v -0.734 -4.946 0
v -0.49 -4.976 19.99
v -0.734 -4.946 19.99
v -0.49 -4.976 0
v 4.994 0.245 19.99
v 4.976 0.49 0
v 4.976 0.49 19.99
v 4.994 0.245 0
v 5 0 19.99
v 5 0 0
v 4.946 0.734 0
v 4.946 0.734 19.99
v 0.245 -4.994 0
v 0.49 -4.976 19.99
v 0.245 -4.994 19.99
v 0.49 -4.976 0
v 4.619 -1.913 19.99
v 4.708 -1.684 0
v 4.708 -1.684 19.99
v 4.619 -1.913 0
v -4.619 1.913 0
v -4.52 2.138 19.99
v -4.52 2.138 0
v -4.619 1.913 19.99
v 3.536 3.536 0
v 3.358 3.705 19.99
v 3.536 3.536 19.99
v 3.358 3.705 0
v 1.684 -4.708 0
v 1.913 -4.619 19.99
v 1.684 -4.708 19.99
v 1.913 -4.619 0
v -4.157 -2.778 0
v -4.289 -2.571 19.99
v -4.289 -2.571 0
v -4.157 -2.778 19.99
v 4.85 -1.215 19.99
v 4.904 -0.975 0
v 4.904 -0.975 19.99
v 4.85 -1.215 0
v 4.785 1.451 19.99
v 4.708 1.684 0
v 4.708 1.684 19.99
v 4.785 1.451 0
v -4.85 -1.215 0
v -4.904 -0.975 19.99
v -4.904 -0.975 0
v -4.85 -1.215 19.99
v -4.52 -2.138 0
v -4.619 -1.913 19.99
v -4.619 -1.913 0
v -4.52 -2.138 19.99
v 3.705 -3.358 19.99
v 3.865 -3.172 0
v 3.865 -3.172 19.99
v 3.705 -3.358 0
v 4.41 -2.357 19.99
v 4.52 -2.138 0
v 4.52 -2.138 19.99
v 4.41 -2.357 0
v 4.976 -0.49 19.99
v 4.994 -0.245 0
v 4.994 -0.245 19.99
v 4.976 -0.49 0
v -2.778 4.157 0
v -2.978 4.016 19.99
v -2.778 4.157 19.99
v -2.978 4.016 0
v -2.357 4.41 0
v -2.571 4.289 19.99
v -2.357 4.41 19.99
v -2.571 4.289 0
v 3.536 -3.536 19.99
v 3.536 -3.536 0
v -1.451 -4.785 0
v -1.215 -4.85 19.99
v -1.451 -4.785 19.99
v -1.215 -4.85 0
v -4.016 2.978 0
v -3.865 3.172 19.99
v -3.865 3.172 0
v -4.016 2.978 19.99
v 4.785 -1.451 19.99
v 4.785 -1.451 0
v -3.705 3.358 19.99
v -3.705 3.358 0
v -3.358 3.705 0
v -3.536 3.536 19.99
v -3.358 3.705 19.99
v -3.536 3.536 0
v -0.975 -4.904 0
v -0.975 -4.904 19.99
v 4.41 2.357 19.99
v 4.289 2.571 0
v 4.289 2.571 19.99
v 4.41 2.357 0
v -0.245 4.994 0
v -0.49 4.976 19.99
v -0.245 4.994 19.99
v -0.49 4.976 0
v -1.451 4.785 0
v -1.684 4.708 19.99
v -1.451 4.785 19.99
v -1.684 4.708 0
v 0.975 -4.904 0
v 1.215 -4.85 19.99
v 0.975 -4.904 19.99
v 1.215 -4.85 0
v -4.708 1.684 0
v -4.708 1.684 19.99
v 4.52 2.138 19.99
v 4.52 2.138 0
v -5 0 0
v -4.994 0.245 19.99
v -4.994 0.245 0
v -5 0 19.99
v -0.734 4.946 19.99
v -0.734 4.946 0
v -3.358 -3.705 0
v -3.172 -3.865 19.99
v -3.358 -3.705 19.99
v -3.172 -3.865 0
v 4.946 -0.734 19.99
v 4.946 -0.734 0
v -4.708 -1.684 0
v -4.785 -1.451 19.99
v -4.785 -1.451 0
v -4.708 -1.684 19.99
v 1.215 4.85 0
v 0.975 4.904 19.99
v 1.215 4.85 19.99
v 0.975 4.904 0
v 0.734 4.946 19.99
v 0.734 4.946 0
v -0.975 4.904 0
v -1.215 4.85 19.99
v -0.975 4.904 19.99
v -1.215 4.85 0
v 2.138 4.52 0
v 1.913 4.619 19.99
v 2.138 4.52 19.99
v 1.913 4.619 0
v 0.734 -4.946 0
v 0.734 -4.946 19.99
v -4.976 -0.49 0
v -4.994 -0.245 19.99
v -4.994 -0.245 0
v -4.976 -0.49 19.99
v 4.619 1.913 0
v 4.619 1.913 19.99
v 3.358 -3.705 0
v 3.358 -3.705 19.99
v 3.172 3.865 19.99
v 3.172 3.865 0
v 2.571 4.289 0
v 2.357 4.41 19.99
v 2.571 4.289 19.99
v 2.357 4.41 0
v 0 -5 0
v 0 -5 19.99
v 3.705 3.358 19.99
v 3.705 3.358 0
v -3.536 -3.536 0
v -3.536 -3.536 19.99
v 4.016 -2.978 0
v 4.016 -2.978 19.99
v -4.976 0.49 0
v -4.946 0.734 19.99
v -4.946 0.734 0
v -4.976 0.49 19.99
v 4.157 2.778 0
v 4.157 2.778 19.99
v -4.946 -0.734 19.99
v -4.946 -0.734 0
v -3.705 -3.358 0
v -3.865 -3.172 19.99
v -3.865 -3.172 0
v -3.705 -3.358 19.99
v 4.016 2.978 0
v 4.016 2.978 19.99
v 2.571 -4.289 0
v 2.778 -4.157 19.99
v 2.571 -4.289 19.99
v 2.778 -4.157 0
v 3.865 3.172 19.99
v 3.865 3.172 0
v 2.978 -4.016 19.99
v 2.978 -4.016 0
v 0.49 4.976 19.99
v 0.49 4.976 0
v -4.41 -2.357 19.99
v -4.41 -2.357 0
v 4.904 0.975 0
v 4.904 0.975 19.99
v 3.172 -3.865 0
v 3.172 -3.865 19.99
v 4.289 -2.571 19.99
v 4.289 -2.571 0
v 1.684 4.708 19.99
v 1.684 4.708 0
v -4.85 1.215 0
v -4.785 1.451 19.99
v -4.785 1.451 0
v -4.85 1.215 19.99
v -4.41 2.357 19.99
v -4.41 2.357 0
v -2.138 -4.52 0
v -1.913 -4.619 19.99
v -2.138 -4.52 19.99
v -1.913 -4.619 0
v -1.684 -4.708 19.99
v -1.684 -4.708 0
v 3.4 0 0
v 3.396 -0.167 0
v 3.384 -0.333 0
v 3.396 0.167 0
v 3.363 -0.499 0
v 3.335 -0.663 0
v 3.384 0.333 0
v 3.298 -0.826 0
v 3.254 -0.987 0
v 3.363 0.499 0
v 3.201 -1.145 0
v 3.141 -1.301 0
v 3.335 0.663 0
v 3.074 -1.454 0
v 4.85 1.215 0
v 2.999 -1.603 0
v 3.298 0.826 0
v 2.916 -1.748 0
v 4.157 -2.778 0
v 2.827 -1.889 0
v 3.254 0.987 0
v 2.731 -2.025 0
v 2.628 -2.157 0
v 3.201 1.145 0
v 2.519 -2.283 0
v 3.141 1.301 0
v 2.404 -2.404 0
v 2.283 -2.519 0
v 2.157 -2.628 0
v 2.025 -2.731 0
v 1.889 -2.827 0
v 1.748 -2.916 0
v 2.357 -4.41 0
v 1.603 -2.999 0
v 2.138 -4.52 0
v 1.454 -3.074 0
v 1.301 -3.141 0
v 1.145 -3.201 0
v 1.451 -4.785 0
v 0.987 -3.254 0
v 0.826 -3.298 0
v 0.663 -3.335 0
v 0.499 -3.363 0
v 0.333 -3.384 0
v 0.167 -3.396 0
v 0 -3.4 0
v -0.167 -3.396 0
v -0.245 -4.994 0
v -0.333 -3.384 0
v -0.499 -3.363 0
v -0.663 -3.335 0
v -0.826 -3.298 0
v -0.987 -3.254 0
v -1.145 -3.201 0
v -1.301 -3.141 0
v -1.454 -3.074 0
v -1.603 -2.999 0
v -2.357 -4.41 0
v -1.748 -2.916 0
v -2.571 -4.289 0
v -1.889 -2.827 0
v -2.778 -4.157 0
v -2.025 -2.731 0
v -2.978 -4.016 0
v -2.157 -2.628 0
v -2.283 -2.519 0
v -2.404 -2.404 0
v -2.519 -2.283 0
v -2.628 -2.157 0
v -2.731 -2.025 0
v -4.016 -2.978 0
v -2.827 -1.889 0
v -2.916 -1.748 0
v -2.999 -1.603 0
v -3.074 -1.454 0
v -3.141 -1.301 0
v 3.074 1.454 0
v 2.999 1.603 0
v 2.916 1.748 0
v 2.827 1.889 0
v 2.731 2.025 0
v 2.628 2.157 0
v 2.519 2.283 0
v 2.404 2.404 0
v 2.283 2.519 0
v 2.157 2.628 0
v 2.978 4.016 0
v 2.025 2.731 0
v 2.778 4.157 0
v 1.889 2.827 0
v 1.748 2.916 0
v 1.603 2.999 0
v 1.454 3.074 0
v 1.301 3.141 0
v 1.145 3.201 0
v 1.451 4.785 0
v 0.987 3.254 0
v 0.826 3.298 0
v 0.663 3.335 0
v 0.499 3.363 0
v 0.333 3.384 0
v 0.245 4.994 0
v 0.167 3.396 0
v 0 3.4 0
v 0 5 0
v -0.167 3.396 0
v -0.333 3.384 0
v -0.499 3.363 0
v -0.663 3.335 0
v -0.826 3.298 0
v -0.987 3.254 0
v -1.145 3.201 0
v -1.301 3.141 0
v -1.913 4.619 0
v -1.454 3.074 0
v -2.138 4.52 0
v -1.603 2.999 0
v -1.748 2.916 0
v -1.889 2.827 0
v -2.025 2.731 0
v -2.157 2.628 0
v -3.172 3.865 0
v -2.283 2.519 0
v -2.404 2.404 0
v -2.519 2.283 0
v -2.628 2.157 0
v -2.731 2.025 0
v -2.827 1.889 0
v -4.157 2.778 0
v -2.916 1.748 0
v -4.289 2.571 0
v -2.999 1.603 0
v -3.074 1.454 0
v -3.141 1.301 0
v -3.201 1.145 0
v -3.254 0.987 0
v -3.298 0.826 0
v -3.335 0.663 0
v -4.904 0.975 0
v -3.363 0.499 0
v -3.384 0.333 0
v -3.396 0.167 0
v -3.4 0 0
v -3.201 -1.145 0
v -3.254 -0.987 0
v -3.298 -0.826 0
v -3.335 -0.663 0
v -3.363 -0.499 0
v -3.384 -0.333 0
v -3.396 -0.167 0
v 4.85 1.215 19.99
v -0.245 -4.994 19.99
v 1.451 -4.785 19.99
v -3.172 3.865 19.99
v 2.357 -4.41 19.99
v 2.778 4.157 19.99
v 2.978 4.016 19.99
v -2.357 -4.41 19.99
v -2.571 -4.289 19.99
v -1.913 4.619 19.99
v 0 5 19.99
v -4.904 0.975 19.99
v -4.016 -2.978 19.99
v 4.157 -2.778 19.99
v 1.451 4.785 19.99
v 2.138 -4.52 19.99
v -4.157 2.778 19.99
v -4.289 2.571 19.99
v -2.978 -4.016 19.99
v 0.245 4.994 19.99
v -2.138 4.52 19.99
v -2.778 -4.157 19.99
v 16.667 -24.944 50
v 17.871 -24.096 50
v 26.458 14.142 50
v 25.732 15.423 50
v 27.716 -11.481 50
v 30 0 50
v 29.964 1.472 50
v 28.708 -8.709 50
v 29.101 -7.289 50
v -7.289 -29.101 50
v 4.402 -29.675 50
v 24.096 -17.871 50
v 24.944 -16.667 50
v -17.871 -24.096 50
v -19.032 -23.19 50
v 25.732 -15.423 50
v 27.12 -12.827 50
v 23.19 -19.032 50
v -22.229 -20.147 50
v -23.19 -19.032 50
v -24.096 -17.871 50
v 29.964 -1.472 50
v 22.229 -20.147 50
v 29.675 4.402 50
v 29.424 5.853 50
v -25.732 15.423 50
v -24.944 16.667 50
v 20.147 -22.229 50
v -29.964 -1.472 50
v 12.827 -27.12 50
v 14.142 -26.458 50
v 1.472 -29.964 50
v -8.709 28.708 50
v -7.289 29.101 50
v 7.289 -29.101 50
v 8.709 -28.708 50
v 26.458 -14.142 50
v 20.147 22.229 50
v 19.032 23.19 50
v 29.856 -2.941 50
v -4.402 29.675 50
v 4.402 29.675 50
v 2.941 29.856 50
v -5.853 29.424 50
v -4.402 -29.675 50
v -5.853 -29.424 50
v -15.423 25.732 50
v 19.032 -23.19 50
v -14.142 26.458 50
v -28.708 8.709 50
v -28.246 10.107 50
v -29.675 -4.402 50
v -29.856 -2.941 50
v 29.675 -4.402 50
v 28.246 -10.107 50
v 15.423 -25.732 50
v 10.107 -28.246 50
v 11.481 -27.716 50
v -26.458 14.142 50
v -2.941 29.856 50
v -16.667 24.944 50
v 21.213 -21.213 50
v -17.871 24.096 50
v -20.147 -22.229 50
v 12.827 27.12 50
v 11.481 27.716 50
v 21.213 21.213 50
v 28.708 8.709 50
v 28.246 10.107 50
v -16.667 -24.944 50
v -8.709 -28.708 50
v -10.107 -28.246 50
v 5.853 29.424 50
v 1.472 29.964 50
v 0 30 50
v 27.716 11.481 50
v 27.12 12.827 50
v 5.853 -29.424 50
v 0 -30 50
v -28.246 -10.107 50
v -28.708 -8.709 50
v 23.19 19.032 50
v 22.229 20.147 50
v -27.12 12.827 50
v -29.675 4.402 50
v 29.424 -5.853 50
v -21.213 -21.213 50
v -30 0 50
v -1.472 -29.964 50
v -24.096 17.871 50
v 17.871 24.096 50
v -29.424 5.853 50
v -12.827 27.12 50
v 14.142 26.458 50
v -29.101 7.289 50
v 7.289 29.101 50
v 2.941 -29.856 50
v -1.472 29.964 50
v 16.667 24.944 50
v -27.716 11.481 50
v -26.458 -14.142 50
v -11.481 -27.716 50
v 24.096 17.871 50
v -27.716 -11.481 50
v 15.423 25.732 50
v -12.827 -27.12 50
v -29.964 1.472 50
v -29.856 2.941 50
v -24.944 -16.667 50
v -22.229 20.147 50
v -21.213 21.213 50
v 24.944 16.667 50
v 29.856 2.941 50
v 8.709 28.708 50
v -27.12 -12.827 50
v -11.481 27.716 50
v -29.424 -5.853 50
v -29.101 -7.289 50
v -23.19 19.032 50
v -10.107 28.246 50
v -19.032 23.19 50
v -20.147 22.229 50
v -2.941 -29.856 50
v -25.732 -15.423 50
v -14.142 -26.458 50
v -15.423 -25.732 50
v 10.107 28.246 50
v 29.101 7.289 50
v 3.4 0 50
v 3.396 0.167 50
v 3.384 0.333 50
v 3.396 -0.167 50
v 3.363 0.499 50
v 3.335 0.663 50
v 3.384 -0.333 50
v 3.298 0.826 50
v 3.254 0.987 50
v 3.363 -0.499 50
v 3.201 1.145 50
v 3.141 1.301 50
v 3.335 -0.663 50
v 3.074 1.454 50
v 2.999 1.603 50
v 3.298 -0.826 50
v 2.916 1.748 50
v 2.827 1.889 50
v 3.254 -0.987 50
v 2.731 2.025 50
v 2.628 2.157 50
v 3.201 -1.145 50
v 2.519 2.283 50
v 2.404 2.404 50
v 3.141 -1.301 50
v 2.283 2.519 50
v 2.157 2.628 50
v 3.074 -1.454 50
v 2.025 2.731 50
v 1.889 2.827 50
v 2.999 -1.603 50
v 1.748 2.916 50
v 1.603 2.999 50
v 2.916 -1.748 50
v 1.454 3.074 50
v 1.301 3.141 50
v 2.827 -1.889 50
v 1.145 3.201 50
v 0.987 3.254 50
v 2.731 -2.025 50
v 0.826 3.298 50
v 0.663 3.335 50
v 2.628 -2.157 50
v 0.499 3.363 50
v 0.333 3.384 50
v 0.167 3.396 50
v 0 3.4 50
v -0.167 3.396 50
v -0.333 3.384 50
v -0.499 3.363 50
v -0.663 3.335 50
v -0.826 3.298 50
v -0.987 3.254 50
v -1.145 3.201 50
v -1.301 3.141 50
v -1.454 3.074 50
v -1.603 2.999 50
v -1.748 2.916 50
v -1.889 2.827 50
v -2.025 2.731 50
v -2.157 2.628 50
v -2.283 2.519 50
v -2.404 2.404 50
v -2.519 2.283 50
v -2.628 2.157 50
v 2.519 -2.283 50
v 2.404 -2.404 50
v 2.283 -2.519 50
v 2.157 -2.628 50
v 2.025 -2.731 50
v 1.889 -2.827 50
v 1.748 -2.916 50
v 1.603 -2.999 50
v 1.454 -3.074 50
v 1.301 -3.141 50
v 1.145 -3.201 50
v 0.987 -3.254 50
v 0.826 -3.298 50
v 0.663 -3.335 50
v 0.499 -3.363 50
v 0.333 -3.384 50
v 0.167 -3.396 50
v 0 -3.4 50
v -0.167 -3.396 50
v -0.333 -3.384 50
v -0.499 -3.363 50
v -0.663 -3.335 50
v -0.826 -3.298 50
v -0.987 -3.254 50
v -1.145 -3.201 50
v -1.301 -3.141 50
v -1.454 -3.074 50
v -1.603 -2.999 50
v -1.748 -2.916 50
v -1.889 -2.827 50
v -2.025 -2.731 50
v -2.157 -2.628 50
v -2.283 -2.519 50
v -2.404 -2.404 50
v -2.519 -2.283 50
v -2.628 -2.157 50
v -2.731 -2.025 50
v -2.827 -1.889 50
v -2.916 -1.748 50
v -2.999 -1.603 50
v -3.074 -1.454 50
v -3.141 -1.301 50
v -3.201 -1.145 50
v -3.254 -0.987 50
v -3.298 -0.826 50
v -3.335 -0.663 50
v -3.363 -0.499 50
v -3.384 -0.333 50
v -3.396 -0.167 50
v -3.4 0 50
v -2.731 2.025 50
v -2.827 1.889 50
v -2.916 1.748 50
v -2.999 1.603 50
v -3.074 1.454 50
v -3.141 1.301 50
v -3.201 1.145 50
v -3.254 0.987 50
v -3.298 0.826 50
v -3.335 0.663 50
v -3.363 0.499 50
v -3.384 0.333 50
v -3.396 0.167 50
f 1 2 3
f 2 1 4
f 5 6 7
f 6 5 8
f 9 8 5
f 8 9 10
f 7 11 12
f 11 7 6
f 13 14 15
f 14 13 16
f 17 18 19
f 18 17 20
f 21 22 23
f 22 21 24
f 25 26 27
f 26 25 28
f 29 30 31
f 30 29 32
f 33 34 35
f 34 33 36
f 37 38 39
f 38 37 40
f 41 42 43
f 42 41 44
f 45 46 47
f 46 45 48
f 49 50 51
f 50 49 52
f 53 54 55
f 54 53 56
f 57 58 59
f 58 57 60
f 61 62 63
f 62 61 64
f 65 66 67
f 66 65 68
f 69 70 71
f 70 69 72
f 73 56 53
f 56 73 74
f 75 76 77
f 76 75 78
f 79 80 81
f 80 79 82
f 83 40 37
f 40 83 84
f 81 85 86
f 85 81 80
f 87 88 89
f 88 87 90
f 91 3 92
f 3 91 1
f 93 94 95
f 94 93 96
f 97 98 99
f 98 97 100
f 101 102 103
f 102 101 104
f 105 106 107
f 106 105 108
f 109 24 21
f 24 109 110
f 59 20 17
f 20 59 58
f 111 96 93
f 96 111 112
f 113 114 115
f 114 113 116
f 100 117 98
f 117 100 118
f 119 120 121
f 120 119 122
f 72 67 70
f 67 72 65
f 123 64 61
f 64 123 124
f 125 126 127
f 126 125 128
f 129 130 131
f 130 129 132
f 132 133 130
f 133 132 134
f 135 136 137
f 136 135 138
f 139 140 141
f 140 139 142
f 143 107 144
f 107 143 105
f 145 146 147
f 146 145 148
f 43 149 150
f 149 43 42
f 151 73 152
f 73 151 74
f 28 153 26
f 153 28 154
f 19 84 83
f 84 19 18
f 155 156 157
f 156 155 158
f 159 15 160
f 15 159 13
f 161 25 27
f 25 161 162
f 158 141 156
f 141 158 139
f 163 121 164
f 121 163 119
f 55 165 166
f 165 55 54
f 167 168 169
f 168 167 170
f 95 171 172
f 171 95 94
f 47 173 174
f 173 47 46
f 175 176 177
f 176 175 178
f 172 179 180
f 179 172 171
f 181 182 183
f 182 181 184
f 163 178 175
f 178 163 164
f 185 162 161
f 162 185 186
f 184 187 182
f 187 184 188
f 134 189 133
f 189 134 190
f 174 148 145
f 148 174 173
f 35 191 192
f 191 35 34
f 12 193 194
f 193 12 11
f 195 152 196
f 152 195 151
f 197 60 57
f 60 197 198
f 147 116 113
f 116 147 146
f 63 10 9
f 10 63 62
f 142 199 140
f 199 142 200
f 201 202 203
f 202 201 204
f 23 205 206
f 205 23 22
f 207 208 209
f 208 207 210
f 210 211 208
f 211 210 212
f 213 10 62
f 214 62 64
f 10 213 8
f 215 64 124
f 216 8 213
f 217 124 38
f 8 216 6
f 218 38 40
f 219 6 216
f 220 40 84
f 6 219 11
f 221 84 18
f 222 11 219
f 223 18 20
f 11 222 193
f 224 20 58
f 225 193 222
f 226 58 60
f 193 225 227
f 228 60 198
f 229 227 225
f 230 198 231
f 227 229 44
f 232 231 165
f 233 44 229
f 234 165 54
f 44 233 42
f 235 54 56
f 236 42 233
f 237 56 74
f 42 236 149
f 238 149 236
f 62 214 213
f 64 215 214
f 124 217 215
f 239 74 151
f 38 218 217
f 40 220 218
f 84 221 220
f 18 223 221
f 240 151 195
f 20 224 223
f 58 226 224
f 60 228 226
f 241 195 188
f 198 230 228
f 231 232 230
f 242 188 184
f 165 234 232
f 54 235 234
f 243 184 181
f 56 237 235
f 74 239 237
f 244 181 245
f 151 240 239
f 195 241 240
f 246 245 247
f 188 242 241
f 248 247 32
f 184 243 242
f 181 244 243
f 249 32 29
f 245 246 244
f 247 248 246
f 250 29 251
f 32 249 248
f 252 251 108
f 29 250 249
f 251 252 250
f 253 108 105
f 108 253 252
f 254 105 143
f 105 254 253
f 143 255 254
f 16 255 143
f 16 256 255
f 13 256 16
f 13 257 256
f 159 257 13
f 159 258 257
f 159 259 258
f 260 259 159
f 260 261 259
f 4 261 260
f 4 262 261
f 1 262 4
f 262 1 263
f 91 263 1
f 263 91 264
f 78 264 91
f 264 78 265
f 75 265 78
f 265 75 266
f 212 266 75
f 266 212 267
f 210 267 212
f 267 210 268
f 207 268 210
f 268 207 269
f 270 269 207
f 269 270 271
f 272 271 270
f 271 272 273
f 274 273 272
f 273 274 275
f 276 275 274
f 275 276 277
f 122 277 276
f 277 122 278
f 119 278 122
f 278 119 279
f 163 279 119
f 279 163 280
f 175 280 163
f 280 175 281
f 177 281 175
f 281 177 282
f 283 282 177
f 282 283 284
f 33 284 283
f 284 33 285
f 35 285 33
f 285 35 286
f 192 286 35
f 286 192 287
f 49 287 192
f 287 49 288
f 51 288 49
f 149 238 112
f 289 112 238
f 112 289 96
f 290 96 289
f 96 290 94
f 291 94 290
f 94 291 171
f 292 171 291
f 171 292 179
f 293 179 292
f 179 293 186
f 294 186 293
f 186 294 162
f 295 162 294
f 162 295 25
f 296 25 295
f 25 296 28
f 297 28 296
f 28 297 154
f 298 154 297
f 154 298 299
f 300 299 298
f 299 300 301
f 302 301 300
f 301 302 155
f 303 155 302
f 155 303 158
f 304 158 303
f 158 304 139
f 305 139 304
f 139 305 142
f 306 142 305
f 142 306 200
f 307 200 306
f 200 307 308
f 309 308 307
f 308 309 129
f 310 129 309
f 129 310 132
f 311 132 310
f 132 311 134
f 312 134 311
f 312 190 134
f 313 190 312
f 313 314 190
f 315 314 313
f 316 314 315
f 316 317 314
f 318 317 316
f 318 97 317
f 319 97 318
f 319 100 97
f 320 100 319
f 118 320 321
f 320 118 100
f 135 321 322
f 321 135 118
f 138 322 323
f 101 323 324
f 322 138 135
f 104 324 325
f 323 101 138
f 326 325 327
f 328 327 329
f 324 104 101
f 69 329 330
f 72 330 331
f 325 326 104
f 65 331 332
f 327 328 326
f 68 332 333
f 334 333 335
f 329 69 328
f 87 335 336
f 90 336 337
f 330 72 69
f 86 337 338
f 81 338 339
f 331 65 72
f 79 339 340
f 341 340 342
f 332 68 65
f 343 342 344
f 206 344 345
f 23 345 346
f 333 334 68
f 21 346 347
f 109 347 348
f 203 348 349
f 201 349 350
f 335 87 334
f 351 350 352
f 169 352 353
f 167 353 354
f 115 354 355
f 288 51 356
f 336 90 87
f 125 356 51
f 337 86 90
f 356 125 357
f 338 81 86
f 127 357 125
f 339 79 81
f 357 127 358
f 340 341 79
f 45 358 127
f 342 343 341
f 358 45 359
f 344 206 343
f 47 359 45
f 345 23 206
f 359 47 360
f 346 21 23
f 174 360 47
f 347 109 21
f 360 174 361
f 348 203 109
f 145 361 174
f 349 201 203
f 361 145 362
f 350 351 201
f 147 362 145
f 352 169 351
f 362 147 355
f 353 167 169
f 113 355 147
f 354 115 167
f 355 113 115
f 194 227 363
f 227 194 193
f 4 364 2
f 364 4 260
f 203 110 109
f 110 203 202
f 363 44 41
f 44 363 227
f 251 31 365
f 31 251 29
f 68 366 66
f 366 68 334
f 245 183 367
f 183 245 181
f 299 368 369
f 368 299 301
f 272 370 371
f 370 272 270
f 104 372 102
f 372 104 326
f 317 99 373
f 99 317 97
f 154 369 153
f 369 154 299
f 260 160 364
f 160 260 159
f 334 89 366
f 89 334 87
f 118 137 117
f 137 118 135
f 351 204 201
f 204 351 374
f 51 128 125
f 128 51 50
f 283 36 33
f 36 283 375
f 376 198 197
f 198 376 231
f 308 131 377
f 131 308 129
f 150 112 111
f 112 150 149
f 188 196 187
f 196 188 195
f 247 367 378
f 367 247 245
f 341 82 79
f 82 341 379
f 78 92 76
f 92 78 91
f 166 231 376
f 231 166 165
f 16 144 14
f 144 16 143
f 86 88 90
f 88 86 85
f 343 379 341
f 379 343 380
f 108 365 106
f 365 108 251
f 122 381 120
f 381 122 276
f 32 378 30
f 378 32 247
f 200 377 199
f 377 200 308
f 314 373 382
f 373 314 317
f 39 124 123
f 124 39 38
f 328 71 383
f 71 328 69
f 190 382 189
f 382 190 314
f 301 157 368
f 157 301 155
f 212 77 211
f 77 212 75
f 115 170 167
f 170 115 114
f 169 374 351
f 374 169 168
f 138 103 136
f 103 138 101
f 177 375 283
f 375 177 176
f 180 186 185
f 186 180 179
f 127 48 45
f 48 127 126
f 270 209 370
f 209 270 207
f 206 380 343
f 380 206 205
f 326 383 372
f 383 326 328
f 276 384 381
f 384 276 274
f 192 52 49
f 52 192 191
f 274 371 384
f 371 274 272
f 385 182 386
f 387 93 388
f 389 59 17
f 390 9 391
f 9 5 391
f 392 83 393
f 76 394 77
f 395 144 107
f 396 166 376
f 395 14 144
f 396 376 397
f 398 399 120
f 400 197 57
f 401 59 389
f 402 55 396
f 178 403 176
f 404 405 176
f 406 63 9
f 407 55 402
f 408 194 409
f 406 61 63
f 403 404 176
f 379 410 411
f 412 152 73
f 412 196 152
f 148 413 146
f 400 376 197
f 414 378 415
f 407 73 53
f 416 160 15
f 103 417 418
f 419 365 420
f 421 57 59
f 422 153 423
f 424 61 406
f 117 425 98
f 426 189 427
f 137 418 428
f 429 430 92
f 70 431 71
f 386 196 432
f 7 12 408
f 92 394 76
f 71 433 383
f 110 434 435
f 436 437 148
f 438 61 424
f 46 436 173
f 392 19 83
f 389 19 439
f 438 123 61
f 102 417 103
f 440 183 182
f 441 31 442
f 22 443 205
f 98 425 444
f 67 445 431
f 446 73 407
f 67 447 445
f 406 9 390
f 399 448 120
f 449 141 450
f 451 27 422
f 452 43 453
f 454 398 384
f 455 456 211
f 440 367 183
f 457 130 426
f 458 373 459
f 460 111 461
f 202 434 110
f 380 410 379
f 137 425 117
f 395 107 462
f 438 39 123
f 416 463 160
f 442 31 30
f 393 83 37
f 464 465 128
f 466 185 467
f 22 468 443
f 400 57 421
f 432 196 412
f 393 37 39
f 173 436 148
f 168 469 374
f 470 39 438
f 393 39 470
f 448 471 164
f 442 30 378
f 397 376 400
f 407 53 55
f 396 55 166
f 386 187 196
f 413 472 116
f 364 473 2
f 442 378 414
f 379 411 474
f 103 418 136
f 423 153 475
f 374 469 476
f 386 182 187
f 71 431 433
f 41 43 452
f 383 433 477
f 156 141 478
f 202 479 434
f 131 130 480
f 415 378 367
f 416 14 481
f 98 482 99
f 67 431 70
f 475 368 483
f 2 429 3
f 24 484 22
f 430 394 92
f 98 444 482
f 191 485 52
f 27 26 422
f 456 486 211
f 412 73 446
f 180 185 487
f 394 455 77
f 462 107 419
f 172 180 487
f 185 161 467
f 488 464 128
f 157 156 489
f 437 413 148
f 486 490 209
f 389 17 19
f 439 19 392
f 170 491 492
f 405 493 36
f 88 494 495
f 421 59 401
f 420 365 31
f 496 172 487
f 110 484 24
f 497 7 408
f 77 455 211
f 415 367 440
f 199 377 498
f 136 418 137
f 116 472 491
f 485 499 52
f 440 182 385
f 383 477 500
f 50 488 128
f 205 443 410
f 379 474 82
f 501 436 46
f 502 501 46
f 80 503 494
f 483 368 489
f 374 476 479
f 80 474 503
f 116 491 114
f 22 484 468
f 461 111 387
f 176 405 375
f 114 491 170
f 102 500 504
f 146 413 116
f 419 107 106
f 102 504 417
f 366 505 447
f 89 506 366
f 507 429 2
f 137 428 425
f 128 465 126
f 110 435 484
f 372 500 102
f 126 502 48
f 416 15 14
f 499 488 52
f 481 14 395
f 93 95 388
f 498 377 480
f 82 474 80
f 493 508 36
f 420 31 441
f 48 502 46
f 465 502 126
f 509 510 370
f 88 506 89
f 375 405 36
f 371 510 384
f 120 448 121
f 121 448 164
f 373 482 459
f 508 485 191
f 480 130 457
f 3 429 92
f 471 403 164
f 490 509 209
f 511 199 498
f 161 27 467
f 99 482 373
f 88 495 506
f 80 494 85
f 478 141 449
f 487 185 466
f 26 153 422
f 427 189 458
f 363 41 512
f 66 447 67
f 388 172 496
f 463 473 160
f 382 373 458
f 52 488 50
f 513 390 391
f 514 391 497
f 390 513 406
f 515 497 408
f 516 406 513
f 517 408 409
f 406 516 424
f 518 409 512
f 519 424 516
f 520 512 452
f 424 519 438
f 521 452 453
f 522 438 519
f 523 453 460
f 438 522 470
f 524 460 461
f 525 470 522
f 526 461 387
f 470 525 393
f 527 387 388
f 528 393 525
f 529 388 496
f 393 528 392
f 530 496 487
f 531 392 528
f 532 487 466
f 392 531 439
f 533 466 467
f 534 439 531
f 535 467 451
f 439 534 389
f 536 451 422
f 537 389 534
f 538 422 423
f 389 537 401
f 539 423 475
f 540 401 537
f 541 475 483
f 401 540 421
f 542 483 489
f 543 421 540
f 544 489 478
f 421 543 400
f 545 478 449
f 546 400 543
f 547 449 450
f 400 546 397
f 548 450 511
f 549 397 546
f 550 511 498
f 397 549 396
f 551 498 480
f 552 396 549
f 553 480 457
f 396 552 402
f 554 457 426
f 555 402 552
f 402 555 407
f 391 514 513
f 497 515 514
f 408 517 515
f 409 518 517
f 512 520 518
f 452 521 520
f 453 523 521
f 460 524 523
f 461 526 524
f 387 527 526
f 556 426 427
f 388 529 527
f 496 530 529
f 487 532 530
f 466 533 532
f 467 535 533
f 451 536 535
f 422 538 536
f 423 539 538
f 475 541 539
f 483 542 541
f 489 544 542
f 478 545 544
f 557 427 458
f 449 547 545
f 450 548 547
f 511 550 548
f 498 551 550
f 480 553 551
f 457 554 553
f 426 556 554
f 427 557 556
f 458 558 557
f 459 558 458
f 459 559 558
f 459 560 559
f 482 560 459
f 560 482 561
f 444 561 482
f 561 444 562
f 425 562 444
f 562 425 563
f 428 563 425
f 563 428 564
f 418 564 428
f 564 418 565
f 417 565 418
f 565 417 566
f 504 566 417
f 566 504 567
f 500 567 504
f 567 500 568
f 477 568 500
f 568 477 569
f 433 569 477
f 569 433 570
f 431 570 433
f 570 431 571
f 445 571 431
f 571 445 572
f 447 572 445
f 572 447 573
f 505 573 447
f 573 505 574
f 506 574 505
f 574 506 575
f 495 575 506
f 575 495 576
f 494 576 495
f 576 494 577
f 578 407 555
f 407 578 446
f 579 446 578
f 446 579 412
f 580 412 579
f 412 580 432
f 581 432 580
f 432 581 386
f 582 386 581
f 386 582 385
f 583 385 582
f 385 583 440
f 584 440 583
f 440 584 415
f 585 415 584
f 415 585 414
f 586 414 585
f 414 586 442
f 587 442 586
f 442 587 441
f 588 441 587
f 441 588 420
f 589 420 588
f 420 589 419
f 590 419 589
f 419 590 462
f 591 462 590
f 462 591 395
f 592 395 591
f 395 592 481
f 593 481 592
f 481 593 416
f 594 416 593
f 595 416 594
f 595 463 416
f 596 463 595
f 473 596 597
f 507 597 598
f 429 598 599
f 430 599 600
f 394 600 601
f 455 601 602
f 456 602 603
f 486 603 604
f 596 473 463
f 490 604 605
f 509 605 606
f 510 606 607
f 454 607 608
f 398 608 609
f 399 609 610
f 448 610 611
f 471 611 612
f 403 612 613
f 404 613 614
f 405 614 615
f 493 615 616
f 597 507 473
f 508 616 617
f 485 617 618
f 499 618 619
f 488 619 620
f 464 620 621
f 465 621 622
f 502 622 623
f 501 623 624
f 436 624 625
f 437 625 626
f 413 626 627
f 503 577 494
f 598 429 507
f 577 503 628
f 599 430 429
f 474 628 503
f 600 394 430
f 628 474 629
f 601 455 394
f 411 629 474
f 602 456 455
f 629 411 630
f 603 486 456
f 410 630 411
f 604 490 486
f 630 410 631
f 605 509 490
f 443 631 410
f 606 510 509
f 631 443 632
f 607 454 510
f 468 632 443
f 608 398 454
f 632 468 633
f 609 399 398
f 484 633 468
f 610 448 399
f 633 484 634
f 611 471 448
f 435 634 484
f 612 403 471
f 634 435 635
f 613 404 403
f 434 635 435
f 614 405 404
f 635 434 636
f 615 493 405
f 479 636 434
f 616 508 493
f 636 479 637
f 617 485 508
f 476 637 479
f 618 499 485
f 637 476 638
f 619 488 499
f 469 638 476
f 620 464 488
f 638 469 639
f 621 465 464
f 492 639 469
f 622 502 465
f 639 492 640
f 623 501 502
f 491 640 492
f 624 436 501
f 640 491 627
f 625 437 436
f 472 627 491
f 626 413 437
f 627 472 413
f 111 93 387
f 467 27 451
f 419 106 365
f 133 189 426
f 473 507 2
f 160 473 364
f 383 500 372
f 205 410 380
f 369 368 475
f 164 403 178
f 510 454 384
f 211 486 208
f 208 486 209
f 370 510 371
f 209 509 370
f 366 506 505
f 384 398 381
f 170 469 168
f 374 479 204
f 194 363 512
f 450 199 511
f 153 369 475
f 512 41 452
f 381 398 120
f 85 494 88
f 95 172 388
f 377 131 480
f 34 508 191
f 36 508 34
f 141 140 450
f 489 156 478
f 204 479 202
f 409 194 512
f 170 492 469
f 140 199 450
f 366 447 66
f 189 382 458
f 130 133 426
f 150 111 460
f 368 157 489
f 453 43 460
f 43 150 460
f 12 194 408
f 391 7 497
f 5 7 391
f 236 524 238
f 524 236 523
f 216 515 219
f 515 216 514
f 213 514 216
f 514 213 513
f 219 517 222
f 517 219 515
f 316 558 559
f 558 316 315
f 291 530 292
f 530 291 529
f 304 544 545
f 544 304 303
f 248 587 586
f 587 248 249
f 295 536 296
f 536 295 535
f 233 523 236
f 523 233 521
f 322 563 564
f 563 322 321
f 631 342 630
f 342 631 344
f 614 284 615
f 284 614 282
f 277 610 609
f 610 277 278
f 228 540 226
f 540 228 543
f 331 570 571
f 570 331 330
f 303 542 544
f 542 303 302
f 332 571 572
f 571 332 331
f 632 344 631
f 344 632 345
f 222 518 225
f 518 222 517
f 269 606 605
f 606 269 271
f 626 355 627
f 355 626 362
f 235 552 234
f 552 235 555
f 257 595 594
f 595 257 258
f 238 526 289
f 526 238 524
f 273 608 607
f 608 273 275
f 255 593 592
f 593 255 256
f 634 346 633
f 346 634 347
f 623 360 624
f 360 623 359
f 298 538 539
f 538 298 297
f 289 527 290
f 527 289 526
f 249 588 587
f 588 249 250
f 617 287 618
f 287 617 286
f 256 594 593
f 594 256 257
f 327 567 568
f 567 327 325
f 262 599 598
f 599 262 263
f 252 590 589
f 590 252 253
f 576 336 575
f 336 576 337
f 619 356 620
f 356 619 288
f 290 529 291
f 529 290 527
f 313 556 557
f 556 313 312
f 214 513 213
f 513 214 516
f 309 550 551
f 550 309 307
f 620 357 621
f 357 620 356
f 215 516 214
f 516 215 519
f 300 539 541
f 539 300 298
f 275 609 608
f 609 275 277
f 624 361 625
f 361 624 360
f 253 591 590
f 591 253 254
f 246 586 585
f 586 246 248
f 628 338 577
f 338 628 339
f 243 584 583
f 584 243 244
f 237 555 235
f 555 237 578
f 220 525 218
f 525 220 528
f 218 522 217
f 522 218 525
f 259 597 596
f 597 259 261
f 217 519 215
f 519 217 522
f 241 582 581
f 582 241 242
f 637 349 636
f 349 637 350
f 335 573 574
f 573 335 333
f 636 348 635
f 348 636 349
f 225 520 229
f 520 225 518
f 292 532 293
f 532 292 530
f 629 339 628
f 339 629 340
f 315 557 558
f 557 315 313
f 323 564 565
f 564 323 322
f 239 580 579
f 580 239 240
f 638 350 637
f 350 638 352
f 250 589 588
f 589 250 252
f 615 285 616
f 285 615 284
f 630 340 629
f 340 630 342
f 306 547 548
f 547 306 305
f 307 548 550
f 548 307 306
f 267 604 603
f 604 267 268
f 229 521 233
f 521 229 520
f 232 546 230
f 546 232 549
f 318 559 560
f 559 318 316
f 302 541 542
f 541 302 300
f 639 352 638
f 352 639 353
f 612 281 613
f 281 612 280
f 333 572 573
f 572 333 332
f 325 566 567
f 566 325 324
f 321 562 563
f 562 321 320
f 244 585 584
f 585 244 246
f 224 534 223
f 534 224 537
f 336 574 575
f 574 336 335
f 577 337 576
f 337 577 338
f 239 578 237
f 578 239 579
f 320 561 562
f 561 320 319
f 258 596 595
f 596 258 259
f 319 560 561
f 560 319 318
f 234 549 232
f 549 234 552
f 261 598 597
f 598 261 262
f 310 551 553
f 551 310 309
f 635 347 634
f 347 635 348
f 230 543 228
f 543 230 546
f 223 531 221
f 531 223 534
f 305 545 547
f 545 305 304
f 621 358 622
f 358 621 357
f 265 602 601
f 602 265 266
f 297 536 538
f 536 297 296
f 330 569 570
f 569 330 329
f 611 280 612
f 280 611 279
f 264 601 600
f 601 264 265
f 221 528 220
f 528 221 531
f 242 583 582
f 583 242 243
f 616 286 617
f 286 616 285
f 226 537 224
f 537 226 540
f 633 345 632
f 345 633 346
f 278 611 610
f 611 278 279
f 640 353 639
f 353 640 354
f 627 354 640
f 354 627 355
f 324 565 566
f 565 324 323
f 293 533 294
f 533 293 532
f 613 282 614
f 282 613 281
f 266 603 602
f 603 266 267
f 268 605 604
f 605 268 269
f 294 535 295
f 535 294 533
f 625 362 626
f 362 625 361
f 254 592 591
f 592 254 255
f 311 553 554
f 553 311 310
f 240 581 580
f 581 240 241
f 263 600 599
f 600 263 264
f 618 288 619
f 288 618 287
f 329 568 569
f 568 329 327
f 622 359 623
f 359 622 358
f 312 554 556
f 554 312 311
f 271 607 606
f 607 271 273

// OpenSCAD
// Lab funnel - printed upright, wide opening at the top
// Units: mm

// ---- Parameters ----
spout_od        = 10;    // outer diameter of straight spout
spout_length    = 20;    // spout runs from z = 0 to z = 20
cone_bottom_od  = 10;    // cone starts at the spout's outer diameter
cone_top_od     = 60;    // cone rim diameter at z = 50
cone_top_z      = 50;    // height of the funnel rim
wall_thickness  = 1.6;   // wall thickness everywhere (spout bore = 6.8 mm)
overlap         = 0.01;  // small overlap so the cone fuses into the spout

$fn = 128;

// ---- Model ----
difference() {
    union() {
        // Straight spout
        cylinder(d = spout_od, h = spout_length);

        // Cone on top, from z = 20 to z = 50
        translate([0, 0, spout_length - overlap])
            cylinder(d1 = cone_bottom_od, d2 = cone_top_od, h = cone_top_z - spout_length + overlap);
    }

    // Through-bore: extends below z = 0 and above z = 50 so the top and
    // bottom stay open for liquid to flow straight through
    translate([0, 0, -overlap])
        cylinder(d = spout_od - 2 * wall_thickness, h = cone_top_z + 2 * overlap);
}
